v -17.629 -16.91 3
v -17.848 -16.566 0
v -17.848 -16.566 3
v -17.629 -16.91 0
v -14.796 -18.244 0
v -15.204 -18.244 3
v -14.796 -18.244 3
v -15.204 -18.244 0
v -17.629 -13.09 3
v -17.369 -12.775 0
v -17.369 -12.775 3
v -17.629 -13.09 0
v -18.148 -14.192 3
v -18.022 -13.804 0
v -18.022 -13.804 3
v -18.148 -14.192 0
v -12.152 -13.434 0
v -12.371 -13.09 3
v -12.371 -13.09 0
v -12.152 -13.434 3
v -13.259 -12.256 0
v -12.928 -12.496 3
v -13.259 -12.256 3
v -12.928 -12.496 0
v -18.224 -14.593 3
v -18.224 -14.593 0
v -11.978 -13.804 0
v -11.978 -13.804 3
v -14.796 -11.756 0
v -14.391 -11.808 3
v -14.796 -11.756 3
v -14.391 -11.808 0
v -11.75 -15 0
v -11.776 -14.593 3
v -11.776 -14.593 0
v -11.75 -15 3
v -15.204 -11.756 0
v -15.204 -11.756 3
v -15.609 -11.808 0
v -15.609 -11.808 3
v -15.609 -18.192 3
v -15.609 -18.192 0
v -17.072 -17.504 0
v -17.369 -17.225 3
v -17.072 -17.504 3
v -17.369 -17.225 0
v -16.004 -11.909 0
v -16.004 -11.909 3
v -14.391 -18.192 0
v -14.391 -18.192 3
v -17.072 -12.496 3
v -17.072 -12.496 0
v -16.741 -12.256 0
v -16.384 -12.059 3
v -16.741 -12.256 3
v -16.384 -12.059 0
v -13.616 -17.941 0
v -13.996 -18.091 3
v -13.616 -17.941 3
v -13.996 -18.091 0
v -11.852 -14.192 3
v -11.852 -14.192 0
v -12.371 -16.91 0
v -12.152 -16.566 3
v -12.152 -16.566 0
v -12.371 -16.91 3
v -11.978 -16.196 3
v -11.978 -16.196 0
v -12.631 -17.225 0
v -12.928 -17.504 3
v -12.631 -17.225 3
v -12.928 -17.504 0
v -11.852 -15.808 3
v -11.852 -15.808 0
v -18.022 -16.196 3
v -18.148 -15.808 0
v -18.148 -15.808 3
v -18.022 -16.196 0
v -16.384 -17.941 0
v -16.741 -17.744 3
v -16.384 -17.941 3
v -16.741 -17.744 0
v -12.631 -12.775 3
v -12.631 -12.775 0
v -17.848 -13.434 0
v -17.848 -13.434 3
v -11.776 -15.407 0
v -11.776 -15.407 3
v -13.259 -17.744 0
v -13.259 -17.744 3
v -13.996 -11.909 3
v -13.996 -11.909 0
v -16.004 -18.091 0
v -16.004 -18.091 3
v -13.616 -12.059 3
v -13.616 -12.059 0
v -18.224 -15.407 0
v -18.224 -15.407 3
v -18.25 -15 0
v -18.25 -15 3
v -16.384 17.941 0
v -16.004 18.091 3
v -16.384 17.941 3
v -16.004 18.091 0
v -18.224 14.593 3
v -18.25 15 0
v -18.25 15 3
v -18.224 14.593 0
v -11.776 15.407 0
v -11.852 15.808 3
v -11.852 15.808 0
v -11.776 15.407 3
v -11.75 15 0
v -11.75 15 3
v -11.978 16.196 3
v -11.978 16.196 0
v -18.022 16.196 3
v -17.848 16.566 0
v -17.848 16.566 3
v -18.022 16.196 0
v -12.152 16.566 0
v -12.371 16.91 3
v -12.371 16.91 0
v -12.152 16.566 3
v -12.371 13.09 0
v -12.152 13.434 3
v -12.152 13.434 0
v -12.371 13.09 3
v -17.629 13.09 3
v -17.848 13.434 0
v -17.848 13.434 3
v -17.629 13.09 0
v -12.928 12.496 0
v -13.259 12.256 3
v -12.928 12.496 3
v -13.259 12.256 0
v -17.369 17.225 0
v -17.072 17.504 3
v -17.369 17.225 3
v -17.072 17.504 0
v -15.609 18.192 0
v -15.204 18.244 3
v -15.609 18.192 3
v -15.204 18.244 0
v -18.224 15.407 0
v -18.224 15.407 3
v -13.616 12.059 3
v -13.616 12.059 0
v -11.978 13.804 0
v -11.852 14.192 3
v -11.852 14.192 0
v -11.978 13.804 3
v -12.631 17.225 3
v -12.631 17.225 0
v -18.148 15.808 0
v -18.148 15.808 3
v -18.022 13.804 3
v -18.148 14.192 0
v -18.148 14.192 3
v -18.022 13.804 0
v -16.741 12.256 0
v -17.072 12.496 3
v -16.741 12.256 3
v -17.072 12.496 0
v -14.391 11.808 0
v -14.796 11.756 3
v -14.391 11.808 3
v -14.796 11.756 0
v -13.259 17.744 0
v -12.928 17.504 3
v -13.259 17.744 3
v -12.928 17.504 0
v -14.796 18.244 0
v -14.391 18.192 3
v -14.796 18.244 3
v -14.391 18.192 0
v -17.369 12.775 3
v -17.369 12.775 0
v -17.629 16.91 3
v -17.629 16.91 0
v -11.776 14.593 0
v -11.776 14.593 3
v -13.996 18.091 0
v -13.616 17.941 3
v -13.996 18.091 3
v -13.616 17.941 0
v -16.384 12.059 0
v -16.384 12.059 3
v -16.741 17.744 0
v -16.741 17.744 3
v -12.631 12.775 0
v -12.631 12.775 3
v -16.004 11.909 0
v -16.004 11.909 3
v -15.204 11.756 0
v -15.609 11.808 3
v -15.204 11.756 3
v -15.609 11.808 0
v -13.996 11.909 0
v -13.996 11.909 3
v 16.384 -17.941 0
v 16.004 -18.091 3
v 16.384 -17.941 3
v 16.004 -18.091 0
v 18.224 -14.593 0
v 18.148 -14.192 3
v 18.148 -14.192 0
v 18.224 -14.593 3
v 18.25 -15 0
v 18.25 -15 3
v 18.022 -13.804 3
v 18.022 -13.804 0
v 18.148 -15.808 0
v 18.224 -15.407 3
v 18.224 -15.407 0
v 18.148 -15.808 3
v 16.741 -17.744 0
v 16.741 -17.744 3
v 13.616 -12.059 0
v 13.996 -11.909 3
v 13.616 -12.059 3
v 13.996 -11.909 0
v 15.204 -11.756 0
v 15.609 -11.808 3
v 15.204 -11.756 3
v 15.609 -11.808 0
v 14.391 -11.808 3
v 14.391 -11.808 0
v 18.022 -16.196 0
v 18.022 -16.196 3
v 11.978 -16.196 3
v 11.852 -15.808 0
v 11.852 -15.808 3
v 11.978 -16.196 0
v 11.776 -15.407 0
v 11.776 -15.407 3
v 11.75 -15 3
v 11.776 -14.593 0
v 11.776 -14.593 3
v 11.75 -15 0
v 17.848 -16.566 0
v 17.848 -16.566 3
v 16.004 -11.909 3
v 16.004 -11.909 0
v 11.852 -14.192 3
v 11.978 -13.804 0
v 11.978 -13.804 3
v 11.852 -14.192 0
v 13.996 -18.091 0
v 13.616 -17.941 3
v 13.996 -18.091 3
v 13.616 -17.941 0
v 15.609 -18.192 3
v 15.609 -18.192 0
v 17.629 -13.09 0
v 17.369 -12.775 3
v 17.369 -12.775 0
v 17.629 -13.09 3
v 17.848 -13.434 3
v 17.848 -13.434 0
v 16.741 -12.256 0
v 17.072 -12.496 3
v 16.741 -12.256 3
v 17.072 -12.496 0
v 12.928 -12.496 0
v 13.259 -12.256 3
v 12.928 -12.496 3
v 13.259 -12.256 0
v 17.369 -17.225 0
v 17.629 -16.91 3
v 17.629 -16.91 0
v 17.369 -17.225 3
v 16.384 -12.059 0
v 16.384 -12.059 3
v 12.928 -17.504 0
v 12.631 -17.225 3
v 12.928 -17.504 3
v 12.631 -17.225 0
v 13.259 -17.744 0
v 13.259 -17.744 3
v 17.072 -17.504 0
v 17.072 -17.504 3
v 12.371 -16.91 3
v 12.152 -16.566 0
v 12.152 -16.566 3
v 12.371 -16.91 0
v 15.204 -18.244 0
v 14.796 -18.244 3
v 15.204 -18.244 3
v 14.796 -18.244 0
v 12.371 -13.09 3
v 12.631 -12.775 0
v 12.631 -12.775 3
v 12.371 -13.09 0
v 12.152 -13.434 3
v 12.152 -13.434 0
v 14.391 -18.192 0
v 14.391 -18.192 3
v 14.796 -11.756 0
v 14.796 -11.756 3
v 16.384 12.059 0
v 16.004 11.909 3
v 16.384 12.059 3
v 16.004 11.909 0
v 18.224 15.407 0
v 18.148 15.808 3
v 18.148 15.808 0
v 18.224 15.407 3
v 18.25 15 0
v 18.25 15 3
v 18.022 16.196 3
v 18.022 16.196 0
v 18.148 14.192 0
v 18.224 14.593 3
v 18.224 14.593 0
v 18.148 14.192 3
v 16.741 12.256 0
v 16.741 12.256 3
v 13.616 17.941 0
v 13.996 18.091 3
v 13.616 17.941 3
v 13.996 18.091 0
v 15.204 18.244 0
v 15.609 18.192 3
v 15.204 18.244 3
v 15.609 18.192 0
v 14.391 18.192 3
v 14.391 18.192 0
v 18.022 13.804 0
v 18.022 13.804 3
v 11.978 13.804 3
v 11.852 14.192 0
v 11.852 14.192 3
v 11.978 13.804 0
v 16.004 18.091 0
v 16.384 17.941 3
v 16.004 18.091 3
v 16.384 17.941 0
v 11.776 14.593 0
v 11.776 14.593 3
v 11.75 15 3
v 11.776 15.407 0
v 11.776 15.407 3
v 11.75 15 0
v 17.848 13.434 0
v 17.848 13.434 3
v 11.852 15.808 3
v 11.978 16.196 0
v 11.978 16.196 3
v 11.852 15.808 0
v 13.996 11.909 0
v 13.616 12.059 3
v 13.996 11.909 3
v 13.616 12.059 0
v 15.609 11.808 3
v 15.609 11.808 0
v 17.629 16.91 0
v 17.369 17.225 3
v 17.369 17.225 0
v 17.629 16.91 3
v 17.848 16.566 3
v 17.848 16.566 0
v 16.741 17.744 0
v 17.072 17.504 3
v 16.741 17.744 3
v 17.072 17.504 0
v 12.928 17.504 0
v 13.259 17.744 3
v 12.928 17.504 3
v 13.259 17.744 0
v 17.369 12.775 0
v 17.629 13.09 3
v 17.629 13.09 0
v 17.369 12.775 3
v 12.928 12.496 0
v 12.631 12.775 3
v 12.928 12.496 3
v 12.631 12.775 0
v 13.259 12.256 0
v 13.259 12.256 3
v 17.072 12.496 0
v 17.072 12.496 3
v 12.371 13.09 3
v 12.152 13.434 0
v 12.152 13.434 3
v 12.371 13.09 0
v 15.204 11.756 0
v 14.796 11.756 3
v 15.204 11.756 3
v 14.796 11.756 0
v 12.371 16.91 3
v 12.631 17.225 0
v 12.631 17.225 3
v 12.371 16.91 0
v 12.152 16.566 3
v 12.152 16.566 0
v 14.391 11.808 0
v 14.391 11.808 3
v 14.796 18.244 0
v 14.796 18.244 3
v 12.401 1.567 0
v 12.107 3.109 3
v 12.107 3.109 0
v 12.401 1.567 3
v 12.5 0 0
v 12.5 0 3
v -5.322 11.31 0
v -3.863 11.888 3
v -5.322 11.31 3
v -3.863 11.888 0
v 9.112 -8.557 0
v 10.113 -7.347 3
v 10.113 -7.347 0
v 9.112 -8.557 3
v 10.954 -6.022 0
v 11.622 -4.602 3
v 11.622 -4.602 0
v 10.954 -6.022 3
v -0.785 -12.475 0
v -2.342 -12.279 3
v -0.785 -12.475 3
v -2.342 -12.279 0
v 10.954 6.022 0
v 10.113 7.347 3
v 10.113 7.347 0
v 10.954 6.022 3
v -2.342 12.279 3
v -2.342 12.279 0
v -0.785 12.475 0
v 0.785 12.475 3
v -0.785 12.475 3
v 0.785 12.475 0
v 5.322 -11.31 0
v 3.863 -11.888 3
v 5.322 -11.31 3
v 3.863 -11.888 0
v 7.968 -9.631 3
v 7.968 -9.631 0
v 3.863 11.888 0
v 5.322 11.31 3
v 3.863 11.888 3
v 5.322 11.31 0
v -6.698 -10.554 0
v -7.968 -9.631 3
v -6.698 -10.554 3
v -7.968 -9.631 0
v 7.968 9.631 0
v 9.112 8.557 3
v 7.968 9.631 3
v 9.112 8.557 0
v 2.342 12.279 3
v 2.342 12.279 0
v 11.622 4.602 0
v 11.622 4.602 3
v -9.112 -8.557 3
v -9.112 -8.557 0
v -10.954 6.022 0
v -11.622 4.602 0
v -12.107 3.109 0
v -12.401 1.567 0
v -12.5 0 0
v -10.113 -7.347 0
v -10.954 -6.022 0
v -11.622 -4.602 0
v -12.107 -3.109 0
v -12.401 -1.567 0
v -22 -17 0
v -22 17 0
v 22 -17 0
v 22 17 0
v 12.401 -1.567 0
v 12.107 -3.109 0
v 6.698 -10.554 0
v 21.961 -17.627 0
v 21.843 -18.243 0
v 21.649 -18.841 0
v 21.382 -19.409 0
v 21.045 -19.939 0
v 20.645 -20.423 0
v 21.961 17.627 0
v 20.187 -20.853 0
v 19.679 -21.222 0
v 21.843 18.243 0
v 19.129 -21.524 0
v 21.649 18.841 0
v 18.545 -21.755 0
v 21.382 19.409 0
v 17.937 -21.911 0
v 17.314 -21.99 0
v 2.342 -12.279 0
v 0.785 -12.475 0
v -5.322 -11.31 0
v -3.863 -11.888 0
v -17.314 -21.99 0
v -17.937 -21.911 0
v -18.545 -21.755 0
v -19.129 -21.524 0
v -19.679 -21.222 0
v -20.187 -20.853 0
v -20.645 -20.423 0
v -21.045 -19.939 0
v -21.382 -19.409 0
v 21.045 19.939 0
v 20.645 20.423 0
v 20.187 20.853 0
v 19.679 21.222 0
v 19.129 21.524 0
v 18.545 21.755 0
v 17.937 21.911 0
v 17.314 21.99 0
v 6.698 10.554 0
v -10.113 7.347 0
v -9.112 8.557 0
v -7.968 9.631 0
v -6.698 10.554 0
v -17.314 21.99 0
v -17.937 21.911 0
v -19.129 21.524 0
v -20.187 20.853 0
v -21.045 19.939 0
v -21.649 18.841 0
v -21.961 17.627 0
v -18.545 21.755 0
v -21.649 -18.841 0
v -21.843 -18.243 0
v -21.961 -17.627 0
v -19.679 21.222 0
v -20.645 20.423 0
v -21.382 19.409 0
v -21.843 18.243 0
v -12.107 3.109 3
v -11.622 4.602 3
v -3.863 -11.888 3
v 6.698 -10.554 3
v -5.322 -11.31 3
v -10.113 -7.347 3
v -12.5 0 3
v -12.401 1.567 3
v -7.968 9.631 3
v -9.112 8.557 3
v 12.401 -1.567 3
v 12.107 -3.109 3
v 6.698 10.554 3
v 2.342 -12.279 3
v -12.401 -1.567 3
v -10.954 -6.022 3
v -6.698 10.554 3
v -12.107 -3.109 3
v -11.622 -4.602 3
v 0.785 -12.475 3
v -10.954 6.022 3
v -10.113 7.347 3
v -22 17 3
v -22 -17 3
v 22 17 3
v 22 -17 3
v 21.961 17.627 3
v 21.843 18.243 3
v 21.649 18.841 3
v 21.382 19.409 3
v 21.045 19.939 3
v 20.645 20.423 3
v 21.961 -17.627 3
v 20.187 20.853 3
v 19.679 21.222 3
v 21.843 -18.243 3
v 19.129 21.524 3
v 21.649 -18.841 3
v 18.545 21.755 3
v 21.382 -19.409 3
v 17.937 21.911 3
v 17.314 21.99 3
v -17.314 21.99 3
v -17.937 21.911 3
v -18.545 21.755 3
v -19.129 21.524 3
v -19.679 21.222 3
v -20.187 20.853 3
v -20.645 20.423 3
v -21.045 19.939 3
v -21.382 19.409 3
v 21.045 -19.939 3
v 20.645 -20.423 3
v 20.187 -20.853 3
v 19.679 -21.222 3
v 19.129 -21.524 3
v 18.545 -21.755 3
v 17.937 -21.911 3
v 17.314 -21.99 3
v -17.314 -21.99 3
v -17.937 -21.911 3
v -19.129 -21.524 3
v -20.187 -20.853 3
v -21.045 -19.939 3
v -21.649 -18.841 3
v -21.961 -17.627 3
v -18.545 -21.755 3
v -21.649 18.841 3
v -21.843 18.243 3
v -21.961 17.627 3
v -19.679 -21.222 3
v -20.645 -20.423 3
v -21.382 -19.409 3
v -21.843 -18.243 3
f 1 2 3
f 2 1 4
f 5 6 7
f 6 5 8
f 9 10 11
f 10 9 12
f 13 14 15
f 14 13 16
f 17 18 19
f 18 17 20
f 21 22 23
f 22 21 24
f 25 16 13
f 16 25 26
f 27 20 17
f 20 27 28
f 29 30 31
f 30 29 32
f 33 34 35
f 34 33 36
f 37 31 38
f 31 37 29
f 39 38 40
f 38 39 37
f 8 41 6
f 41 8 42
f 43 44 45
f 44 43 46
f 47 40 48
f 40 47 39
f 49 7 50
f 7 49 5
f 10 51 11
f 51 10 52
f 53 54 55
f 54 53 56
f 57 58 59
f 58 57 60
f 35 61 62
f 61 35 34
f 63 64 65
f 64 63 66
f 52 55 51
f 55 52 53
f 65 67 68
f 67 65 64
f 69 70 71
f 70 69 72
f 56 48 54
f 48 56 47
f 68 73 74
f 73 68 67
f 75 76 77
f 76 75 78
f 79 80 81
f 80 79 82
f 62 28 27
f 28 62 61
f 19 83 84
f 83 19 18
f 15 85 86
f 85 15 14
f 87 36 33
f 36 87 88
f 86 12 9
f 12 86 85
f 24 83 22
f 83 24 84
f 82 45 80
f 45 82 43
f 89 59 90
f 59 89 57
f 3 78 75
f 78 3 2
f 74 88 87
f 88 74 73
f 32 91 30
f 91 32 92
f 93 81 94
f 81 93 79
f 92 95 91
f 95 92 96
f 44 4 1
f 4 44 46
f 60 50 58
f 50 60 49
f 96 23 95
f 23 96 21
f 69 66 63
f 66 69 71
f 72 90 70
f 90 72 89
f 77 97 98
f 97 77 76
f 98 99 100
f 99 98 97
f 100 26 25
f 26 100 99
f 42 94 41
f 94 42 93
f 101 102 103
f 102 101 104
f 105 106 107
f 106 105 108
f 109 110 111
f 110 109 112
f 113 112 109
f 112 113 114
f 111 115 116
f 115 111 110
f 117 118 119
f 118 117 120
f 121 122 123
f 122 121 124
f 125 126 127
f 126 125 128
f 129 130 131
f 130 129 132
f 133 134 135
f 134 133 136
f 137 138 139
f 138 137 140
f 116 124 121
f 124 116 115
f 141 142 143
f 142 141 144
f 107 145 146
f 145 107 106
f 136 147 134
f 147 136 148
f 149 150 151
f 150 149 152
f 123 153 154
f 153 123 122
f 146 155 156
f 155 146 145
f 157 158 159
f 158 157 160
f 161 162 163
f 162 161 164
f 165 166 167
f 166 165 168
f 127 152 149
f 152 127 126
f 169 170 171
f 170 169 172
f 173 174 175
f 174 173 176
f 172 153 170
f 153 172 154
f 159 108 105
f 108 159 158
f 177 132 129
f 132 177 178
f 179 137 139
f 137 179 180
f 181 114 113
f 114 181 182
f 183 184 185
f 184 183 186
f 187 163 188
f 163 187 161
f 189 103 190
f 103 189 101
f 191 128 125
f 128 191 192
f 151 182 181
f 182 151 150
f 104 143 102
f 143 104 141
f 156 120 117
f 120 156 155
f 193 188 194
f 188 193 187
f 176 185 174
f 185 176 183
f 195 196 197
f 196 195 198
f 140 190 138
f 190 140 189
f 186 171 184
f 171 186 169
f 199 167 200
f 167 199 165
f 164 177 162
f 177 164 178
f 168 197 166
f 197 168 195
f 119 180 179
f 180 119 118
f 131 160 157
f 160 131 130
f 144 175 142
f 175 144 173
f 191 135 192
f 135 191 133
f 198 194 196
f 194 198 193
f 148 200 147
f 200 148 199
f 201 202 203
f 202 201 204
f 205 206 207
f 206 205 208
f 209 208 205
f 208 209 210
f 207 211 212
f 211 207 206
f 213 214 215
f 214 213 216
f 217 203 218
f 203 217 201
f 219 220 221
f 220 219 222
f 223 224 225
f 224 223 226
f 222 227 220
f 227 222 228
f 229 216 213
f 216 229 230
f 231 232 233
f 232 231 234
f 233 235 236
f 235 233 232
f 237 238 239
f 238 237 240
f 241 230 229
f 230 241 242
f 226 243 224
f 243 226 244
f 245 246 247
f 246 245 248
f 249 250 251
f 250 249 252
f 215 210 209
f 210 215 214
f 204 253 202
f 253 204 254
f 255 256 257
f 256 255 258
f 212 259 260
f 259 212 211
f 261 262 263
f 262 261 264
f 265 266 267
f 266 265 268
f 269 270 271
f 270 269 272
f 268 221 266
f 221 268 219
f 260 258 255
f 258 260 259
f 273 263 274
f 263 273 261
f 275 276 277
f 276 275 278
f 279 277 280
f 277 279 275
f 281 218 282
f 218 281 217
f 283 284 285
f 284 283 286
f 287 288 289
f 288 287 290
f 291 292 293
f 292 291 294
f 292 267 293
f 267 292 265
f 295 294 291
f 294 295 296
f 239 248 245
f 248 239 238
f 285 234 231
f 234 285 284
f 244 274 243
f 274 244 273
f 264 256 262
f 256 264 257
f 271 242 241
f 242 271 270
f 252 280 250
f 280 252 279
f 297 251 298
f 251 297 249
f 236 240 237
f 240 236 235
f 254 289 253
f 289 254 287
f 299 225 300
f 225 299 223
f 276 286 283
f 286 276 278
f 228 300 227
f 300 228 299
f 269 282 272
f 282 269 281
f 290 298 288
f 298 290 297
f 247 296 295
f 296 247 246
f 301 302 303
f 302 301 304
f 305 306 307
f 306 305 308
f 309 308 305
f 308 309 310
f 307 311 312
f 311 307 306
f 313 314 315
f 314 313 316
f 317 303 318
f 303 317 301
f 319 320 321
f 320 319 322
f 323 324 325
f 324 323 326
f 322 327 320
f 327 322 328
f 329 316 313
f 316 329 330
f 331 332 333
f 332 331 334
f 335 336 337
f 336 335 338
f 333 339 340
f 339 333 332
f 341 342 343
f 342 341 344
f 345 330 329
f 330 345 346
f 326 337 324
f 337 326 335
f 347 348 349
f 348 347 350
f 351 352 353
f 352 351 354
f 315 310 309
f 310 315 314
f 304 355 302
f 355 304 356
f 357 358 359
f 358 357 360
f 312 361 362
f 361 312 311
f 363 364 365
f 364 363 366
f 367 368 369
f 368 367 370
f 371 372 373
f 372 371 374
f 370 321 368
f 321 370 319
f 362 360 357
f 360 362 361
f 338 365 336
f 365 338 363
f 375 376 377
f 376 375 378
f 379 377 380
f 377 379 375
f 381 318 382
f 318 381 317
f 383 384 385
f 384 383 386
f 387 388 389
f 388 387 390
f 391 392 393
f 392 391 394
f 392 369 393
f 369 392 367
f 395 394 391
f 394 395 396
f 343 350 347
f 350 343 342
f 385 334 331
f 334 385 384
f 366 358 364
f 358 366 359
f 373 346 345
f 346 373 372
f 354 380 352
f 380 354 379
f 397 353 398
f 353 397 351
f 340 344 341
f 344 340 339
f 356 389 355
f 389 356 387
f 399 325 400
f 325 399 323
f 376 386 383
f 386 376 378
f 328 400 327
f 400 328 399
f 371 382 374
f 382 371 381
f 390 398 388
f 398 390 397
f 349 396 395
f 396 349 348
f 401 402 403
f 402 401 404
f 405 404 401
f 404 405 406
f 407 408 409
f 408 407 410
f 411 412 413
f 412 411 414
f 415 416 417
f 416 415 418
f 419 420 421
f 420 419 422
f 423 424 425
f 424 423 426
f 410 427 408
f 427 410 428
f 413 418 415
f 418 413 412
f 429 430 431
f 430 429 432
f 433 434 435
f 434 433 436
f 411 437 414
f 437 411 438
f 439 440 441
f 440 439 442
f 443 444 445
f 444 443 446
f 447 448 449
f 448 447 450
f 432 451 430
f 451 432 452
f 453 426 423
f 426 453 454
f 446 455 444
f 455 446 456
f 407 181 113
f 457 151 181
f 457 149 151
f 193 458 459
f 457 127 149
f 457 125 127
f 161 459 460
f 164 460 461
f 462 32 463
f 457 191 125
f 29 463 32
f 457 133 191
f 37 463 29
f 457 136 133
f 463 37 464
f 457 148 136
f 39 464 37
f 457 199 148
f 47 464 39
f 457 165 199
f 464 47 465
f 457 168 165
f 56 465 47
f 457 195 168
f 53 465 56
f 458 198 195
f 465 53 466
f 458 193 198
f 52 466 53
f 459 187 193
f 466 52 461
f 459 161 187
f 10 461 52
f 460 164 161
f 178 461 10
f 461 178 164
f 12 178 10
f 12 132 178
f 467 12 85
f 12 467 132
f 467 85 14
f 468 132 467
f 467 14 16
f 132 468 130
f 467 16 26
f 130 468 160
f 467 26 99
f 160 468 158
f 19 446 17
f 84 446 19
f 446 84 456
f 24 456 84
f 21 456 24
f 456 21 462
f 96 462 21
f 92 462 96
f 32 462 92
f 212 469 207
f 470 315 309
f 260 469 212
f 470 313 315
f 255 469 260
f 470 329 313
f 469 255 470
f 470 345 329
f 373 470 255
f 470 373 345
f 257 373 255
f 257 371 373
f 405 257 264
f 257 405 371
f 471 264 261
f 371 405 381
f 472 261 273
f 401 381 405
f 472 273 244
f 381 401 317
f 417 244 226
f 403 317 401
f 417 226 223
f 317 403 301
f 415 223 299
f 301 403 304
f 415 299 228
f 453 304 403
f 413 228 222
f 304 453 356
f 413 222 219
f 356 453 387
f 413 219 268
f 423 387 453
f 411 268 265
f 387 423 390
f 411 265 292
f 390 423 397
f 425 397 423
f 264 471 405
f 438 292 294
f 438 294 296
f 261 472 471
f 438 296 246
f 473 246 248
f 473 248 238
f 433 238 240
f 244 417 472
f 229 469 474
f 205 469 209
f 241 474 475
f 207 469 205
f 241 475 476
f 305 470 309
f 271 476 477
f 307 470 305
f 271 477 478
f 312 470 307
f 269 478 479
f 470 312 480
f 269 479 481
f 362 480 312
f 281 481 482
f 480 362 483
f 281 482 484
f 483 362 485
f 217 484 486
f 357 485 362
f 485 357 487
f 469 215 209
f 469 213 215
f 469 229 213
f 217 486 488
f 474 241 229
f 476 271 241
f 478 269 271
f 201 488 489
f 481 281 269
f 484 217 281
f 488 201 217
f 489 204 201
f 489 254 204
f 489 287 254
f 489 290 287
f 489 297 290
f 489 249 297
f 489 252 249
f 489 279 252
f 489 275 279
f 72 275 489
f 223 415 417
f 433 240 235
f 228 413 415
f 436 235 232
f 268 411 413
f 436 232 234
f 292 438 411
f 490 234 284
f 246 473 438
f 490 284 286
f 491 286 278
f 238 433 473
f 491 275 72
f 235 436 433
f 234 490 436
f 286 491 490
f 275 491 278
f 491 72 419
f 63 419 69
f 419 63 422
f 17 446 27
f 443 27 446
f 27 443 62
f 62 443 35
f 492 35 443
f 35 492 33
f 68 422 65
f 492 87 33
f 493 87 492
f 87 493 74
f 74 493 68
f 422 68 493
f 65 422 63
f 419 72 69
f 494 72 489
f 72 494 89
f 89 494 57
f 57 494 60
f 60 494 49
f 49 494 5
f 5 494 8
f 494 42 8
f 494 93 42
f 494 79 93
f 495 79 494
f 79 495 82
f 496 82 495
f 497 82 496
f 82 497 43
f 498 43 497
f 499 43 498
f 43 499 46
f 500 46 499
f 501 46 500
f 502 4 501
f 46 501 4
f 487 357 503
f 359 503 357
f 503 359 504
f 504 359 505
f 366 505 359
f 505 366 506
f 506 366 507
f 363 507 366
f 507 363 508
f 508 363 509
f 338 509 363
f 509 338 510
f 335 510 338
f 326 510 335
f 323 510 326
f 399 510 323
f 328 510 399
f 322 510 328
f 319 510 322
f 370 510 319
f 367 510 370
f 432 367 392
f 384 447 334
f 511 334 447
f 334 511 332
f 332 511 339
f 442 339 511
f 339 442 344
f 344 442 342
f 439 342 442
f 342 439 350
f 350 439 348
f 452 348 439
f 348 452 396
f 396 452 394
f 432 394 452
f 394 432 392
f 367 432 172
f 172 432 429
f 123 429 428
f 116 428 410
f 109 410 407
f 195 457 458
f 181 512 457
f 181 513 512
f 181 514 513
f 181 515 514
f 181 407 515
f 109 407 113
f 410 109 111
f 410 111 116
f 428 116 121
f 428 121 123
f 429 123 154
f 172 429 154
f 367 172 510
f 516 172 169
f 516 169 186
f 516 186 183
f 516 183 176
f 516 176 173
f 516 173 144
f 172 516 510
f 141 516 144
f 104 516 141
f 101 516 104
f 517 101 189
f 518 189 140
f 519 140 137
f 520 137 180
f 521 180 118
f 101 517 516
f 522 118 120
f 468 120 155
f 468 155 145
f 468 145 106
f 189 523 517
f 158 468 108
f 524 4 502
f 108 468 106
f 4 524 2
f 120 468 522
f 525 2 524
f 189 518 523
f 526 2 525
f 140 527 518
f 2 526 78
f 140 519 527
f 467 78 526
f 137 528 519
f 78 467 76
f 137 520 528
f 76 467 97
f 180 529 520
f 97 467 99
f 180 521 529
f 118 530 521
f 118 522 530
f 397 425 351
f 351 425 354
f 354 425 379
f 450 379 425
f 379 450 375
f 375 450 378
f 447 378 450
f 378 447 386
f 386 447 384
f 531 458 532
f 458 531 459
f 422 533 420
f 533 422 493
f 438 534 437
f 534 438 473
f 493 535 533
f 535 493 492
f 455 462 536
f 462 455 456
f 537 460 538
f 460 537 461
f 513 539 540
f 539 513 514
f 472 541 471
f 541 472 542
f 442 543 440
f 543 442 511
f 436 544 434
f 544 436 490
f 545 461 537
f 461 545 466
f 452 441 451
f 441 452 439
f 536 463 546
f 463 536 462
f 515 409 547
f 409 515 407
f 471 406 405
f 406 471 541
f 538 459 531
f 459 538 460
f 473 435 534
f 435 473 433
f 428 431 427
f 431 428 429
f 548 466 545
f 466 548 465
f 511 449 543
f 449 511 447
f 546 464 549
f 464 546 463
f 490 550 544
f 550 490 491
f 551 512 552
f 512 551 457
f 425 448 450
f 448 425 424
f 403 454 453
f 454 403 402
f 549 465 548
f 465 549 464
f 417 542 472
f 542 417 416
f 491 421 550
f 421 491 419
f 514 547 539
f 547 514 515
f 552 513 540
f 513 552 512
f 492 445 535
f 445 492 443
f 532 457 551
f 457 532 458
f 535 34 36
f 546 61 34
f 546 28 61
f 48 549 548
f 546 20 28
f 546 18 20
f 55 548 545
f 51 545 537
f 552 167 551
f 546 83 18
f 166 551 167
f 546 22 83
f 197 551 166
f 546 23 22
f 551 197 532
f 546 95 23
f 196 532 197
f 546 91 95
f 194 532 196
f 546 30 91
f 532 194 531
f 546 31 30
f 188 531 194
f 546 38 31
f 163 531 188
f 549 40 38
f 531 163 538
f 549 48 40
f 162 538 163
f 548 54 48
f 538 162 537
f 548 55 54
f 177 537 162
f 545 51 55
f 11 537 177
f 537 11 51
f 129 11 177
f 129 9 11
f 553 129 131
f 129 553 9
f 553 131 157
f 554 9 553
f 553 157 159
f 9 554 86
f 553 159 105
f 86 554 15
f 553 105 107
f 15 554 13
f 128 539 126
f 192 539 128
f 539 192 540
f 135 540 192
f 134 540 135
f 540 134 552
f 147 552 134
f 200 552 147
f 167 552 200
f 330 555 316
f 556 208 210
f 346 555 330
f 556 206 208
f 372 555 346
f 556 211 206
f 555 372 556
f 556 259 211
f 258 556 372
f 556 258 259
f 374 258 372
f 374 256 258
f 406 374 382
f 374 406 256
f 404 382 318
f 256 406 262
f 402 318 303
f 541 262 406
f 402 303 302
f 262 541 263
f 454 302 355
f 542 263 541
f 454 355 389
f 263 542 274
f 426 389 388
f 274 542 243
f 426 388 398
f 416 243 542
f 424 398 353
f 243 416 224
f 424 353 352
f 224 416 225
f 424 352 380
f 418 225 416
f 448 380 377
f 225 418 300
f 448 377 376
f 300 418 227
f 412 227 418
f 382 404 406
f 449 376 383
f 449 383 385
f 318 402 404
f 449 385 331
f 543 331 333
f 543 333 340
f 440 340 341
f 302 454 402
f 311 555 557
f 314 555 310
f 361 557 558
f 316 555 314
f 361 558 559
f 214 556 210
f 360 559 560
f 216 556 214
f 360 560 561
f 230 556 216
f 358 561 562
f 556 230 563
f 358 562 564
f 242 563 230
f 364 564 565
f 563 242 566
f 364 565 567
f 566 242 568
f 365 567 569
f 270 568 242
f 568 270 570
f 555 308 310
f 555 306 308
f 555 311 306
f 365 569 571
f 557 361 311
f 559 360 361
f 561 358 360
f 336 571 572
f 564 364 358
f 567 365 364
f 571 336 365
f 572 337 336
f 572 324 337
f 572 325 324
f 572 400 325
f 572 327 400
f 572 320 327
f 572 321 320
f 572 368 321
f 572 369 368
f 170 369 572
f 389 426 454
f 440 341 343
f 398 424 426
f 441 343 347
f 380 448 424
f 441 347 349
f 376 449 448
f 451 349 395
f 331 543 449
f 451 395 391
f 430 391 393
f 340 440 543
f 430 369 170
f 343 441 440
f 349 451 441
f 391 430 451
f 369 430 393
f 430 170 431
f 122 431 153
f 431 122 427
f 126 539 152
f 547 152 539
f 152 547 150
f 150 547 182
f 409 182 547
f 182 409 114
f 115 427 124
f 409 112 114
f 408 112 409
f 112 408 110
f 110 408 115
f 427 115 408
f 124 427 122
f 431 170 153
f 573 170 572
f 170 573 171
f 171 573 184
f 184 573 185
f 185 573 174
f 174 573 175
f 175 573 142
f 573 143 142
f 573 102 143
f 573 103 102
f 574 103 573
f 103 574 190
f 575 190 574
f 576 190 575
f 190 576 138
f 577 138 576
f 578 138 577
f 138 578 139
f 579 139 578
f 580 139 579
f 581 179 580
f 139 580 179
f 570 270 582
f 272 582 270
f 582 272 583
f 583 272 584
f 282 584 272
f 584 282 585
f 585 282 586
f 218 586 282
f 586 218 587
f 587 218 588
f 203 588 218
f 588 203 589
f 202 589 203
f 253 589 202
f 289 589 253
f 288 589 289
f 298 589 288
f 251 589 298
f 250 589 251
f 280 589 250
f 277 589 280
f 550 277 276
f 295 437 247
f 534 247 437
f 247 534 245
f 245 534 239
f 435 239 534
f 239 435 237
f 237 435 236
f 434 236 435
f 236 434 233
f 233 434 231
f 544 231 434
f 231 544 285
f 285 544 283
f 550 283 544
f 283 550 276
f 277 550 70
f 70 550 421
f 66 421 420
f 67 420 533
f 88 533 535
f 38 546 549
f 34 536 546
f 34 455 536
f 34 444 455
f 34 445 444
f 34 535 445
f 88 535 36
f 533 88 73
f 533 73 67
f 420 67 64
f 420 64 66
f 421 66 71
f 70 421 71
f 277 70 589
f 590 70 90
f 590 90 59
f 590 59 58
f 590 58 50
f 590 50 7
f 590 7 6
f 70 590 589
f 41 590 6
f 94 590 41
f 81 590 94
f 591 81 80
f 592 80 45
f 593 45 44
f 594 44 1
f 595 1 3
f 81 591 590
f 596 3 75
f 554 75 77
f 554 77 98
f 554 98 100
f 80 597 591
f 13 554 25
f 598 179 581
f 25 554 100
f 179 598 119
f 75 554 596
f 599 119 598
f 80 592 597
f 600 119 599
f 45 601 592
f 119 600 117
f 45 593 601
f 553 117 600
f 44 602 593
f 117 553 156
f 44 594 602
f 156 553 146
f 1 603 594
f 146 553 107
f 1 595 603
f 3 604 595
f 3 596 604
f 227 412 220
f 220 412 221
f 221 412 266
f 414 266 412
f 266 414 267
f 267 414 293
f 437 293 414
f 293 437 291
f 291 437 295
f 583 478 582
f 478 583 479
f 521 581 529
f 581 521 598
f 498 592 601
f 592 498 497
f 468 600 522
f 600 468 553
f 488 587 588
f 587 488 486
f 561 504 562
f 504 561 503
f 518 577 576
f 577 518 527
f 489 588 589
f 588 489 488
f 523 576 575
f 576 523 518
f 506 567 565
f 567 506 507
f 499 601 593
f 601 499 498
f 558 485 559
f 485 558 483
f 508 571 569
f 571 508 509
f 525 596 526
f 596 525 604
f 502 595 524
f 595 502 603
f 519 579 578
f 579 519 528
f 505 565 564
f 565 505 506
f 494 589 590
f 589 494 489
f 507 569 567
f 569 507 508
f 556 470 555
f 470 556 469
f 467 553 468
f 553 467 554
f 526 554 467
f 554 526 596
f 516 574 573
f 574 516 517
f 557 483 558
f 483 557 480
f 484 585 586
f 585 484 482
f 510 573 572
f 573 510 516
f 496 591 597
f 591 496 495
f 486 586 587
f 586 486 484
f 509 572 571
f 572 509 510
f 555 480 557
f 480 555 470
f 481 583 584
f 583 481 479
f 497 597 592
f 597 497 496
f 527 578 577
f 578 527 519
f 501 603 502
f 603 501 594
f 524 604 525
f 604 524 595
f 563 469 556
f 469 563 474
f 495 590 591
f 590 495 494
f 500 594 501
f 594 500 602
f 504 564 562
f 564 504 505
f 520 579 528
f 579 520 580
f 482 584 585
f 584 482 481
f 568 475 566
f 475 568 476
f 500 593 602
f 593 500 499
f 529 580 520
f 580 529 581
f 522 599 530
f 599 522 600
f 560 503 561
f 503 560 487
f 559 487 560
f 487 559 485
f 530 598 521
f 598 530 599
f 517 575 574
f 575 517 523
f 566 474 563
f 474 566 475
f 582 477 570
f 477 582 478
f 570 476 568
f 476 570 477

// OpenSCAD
$fn = 50;


difference() {
	union() {
		hull() {
			translate(v = [-17.0000000000, 17.0000000000, 0]) {
				cylinder(h = 3, r = 5);
			}
			translate(v = [17.0000000000, 17.0000000000, 0]) {
				cylinder(h = 3, r = 5);
			}
			translate(v = [-17.0000000000, -17.0000000000, 0]) {
				cylinder(h = 3, r = 5);
			}
			translate(v = [17.0000000000, -17.0000000000, 0]) {
				cylinder(h = 3, r = 5);
			}
		}
	}
	union() {
		#translate(v = [-15.0000000000, -15.0000000000, -100.0000000000]) {
			cylinder(h = 200, r = 3.2500000000);
		}
		#translate(v = [-15.0000000000, 15.0000000000, -100.0000000000]) {
			cylinder(h = 200, r = 3.2500000000);
		}
		#translate(v = [15.0000000000, -15.0000000000, -100.0000000000]) {
			cylinder(h = 200, r = 3.2500000000);
		}
		#translate(v = [15.0000000000, 15.0000000000, -100.0000000000]) {
			cylinder(h = 200, r = 3.2500000000);
		}
		#cylinder(h = 3, r = 12.5000000000);
	}
}
